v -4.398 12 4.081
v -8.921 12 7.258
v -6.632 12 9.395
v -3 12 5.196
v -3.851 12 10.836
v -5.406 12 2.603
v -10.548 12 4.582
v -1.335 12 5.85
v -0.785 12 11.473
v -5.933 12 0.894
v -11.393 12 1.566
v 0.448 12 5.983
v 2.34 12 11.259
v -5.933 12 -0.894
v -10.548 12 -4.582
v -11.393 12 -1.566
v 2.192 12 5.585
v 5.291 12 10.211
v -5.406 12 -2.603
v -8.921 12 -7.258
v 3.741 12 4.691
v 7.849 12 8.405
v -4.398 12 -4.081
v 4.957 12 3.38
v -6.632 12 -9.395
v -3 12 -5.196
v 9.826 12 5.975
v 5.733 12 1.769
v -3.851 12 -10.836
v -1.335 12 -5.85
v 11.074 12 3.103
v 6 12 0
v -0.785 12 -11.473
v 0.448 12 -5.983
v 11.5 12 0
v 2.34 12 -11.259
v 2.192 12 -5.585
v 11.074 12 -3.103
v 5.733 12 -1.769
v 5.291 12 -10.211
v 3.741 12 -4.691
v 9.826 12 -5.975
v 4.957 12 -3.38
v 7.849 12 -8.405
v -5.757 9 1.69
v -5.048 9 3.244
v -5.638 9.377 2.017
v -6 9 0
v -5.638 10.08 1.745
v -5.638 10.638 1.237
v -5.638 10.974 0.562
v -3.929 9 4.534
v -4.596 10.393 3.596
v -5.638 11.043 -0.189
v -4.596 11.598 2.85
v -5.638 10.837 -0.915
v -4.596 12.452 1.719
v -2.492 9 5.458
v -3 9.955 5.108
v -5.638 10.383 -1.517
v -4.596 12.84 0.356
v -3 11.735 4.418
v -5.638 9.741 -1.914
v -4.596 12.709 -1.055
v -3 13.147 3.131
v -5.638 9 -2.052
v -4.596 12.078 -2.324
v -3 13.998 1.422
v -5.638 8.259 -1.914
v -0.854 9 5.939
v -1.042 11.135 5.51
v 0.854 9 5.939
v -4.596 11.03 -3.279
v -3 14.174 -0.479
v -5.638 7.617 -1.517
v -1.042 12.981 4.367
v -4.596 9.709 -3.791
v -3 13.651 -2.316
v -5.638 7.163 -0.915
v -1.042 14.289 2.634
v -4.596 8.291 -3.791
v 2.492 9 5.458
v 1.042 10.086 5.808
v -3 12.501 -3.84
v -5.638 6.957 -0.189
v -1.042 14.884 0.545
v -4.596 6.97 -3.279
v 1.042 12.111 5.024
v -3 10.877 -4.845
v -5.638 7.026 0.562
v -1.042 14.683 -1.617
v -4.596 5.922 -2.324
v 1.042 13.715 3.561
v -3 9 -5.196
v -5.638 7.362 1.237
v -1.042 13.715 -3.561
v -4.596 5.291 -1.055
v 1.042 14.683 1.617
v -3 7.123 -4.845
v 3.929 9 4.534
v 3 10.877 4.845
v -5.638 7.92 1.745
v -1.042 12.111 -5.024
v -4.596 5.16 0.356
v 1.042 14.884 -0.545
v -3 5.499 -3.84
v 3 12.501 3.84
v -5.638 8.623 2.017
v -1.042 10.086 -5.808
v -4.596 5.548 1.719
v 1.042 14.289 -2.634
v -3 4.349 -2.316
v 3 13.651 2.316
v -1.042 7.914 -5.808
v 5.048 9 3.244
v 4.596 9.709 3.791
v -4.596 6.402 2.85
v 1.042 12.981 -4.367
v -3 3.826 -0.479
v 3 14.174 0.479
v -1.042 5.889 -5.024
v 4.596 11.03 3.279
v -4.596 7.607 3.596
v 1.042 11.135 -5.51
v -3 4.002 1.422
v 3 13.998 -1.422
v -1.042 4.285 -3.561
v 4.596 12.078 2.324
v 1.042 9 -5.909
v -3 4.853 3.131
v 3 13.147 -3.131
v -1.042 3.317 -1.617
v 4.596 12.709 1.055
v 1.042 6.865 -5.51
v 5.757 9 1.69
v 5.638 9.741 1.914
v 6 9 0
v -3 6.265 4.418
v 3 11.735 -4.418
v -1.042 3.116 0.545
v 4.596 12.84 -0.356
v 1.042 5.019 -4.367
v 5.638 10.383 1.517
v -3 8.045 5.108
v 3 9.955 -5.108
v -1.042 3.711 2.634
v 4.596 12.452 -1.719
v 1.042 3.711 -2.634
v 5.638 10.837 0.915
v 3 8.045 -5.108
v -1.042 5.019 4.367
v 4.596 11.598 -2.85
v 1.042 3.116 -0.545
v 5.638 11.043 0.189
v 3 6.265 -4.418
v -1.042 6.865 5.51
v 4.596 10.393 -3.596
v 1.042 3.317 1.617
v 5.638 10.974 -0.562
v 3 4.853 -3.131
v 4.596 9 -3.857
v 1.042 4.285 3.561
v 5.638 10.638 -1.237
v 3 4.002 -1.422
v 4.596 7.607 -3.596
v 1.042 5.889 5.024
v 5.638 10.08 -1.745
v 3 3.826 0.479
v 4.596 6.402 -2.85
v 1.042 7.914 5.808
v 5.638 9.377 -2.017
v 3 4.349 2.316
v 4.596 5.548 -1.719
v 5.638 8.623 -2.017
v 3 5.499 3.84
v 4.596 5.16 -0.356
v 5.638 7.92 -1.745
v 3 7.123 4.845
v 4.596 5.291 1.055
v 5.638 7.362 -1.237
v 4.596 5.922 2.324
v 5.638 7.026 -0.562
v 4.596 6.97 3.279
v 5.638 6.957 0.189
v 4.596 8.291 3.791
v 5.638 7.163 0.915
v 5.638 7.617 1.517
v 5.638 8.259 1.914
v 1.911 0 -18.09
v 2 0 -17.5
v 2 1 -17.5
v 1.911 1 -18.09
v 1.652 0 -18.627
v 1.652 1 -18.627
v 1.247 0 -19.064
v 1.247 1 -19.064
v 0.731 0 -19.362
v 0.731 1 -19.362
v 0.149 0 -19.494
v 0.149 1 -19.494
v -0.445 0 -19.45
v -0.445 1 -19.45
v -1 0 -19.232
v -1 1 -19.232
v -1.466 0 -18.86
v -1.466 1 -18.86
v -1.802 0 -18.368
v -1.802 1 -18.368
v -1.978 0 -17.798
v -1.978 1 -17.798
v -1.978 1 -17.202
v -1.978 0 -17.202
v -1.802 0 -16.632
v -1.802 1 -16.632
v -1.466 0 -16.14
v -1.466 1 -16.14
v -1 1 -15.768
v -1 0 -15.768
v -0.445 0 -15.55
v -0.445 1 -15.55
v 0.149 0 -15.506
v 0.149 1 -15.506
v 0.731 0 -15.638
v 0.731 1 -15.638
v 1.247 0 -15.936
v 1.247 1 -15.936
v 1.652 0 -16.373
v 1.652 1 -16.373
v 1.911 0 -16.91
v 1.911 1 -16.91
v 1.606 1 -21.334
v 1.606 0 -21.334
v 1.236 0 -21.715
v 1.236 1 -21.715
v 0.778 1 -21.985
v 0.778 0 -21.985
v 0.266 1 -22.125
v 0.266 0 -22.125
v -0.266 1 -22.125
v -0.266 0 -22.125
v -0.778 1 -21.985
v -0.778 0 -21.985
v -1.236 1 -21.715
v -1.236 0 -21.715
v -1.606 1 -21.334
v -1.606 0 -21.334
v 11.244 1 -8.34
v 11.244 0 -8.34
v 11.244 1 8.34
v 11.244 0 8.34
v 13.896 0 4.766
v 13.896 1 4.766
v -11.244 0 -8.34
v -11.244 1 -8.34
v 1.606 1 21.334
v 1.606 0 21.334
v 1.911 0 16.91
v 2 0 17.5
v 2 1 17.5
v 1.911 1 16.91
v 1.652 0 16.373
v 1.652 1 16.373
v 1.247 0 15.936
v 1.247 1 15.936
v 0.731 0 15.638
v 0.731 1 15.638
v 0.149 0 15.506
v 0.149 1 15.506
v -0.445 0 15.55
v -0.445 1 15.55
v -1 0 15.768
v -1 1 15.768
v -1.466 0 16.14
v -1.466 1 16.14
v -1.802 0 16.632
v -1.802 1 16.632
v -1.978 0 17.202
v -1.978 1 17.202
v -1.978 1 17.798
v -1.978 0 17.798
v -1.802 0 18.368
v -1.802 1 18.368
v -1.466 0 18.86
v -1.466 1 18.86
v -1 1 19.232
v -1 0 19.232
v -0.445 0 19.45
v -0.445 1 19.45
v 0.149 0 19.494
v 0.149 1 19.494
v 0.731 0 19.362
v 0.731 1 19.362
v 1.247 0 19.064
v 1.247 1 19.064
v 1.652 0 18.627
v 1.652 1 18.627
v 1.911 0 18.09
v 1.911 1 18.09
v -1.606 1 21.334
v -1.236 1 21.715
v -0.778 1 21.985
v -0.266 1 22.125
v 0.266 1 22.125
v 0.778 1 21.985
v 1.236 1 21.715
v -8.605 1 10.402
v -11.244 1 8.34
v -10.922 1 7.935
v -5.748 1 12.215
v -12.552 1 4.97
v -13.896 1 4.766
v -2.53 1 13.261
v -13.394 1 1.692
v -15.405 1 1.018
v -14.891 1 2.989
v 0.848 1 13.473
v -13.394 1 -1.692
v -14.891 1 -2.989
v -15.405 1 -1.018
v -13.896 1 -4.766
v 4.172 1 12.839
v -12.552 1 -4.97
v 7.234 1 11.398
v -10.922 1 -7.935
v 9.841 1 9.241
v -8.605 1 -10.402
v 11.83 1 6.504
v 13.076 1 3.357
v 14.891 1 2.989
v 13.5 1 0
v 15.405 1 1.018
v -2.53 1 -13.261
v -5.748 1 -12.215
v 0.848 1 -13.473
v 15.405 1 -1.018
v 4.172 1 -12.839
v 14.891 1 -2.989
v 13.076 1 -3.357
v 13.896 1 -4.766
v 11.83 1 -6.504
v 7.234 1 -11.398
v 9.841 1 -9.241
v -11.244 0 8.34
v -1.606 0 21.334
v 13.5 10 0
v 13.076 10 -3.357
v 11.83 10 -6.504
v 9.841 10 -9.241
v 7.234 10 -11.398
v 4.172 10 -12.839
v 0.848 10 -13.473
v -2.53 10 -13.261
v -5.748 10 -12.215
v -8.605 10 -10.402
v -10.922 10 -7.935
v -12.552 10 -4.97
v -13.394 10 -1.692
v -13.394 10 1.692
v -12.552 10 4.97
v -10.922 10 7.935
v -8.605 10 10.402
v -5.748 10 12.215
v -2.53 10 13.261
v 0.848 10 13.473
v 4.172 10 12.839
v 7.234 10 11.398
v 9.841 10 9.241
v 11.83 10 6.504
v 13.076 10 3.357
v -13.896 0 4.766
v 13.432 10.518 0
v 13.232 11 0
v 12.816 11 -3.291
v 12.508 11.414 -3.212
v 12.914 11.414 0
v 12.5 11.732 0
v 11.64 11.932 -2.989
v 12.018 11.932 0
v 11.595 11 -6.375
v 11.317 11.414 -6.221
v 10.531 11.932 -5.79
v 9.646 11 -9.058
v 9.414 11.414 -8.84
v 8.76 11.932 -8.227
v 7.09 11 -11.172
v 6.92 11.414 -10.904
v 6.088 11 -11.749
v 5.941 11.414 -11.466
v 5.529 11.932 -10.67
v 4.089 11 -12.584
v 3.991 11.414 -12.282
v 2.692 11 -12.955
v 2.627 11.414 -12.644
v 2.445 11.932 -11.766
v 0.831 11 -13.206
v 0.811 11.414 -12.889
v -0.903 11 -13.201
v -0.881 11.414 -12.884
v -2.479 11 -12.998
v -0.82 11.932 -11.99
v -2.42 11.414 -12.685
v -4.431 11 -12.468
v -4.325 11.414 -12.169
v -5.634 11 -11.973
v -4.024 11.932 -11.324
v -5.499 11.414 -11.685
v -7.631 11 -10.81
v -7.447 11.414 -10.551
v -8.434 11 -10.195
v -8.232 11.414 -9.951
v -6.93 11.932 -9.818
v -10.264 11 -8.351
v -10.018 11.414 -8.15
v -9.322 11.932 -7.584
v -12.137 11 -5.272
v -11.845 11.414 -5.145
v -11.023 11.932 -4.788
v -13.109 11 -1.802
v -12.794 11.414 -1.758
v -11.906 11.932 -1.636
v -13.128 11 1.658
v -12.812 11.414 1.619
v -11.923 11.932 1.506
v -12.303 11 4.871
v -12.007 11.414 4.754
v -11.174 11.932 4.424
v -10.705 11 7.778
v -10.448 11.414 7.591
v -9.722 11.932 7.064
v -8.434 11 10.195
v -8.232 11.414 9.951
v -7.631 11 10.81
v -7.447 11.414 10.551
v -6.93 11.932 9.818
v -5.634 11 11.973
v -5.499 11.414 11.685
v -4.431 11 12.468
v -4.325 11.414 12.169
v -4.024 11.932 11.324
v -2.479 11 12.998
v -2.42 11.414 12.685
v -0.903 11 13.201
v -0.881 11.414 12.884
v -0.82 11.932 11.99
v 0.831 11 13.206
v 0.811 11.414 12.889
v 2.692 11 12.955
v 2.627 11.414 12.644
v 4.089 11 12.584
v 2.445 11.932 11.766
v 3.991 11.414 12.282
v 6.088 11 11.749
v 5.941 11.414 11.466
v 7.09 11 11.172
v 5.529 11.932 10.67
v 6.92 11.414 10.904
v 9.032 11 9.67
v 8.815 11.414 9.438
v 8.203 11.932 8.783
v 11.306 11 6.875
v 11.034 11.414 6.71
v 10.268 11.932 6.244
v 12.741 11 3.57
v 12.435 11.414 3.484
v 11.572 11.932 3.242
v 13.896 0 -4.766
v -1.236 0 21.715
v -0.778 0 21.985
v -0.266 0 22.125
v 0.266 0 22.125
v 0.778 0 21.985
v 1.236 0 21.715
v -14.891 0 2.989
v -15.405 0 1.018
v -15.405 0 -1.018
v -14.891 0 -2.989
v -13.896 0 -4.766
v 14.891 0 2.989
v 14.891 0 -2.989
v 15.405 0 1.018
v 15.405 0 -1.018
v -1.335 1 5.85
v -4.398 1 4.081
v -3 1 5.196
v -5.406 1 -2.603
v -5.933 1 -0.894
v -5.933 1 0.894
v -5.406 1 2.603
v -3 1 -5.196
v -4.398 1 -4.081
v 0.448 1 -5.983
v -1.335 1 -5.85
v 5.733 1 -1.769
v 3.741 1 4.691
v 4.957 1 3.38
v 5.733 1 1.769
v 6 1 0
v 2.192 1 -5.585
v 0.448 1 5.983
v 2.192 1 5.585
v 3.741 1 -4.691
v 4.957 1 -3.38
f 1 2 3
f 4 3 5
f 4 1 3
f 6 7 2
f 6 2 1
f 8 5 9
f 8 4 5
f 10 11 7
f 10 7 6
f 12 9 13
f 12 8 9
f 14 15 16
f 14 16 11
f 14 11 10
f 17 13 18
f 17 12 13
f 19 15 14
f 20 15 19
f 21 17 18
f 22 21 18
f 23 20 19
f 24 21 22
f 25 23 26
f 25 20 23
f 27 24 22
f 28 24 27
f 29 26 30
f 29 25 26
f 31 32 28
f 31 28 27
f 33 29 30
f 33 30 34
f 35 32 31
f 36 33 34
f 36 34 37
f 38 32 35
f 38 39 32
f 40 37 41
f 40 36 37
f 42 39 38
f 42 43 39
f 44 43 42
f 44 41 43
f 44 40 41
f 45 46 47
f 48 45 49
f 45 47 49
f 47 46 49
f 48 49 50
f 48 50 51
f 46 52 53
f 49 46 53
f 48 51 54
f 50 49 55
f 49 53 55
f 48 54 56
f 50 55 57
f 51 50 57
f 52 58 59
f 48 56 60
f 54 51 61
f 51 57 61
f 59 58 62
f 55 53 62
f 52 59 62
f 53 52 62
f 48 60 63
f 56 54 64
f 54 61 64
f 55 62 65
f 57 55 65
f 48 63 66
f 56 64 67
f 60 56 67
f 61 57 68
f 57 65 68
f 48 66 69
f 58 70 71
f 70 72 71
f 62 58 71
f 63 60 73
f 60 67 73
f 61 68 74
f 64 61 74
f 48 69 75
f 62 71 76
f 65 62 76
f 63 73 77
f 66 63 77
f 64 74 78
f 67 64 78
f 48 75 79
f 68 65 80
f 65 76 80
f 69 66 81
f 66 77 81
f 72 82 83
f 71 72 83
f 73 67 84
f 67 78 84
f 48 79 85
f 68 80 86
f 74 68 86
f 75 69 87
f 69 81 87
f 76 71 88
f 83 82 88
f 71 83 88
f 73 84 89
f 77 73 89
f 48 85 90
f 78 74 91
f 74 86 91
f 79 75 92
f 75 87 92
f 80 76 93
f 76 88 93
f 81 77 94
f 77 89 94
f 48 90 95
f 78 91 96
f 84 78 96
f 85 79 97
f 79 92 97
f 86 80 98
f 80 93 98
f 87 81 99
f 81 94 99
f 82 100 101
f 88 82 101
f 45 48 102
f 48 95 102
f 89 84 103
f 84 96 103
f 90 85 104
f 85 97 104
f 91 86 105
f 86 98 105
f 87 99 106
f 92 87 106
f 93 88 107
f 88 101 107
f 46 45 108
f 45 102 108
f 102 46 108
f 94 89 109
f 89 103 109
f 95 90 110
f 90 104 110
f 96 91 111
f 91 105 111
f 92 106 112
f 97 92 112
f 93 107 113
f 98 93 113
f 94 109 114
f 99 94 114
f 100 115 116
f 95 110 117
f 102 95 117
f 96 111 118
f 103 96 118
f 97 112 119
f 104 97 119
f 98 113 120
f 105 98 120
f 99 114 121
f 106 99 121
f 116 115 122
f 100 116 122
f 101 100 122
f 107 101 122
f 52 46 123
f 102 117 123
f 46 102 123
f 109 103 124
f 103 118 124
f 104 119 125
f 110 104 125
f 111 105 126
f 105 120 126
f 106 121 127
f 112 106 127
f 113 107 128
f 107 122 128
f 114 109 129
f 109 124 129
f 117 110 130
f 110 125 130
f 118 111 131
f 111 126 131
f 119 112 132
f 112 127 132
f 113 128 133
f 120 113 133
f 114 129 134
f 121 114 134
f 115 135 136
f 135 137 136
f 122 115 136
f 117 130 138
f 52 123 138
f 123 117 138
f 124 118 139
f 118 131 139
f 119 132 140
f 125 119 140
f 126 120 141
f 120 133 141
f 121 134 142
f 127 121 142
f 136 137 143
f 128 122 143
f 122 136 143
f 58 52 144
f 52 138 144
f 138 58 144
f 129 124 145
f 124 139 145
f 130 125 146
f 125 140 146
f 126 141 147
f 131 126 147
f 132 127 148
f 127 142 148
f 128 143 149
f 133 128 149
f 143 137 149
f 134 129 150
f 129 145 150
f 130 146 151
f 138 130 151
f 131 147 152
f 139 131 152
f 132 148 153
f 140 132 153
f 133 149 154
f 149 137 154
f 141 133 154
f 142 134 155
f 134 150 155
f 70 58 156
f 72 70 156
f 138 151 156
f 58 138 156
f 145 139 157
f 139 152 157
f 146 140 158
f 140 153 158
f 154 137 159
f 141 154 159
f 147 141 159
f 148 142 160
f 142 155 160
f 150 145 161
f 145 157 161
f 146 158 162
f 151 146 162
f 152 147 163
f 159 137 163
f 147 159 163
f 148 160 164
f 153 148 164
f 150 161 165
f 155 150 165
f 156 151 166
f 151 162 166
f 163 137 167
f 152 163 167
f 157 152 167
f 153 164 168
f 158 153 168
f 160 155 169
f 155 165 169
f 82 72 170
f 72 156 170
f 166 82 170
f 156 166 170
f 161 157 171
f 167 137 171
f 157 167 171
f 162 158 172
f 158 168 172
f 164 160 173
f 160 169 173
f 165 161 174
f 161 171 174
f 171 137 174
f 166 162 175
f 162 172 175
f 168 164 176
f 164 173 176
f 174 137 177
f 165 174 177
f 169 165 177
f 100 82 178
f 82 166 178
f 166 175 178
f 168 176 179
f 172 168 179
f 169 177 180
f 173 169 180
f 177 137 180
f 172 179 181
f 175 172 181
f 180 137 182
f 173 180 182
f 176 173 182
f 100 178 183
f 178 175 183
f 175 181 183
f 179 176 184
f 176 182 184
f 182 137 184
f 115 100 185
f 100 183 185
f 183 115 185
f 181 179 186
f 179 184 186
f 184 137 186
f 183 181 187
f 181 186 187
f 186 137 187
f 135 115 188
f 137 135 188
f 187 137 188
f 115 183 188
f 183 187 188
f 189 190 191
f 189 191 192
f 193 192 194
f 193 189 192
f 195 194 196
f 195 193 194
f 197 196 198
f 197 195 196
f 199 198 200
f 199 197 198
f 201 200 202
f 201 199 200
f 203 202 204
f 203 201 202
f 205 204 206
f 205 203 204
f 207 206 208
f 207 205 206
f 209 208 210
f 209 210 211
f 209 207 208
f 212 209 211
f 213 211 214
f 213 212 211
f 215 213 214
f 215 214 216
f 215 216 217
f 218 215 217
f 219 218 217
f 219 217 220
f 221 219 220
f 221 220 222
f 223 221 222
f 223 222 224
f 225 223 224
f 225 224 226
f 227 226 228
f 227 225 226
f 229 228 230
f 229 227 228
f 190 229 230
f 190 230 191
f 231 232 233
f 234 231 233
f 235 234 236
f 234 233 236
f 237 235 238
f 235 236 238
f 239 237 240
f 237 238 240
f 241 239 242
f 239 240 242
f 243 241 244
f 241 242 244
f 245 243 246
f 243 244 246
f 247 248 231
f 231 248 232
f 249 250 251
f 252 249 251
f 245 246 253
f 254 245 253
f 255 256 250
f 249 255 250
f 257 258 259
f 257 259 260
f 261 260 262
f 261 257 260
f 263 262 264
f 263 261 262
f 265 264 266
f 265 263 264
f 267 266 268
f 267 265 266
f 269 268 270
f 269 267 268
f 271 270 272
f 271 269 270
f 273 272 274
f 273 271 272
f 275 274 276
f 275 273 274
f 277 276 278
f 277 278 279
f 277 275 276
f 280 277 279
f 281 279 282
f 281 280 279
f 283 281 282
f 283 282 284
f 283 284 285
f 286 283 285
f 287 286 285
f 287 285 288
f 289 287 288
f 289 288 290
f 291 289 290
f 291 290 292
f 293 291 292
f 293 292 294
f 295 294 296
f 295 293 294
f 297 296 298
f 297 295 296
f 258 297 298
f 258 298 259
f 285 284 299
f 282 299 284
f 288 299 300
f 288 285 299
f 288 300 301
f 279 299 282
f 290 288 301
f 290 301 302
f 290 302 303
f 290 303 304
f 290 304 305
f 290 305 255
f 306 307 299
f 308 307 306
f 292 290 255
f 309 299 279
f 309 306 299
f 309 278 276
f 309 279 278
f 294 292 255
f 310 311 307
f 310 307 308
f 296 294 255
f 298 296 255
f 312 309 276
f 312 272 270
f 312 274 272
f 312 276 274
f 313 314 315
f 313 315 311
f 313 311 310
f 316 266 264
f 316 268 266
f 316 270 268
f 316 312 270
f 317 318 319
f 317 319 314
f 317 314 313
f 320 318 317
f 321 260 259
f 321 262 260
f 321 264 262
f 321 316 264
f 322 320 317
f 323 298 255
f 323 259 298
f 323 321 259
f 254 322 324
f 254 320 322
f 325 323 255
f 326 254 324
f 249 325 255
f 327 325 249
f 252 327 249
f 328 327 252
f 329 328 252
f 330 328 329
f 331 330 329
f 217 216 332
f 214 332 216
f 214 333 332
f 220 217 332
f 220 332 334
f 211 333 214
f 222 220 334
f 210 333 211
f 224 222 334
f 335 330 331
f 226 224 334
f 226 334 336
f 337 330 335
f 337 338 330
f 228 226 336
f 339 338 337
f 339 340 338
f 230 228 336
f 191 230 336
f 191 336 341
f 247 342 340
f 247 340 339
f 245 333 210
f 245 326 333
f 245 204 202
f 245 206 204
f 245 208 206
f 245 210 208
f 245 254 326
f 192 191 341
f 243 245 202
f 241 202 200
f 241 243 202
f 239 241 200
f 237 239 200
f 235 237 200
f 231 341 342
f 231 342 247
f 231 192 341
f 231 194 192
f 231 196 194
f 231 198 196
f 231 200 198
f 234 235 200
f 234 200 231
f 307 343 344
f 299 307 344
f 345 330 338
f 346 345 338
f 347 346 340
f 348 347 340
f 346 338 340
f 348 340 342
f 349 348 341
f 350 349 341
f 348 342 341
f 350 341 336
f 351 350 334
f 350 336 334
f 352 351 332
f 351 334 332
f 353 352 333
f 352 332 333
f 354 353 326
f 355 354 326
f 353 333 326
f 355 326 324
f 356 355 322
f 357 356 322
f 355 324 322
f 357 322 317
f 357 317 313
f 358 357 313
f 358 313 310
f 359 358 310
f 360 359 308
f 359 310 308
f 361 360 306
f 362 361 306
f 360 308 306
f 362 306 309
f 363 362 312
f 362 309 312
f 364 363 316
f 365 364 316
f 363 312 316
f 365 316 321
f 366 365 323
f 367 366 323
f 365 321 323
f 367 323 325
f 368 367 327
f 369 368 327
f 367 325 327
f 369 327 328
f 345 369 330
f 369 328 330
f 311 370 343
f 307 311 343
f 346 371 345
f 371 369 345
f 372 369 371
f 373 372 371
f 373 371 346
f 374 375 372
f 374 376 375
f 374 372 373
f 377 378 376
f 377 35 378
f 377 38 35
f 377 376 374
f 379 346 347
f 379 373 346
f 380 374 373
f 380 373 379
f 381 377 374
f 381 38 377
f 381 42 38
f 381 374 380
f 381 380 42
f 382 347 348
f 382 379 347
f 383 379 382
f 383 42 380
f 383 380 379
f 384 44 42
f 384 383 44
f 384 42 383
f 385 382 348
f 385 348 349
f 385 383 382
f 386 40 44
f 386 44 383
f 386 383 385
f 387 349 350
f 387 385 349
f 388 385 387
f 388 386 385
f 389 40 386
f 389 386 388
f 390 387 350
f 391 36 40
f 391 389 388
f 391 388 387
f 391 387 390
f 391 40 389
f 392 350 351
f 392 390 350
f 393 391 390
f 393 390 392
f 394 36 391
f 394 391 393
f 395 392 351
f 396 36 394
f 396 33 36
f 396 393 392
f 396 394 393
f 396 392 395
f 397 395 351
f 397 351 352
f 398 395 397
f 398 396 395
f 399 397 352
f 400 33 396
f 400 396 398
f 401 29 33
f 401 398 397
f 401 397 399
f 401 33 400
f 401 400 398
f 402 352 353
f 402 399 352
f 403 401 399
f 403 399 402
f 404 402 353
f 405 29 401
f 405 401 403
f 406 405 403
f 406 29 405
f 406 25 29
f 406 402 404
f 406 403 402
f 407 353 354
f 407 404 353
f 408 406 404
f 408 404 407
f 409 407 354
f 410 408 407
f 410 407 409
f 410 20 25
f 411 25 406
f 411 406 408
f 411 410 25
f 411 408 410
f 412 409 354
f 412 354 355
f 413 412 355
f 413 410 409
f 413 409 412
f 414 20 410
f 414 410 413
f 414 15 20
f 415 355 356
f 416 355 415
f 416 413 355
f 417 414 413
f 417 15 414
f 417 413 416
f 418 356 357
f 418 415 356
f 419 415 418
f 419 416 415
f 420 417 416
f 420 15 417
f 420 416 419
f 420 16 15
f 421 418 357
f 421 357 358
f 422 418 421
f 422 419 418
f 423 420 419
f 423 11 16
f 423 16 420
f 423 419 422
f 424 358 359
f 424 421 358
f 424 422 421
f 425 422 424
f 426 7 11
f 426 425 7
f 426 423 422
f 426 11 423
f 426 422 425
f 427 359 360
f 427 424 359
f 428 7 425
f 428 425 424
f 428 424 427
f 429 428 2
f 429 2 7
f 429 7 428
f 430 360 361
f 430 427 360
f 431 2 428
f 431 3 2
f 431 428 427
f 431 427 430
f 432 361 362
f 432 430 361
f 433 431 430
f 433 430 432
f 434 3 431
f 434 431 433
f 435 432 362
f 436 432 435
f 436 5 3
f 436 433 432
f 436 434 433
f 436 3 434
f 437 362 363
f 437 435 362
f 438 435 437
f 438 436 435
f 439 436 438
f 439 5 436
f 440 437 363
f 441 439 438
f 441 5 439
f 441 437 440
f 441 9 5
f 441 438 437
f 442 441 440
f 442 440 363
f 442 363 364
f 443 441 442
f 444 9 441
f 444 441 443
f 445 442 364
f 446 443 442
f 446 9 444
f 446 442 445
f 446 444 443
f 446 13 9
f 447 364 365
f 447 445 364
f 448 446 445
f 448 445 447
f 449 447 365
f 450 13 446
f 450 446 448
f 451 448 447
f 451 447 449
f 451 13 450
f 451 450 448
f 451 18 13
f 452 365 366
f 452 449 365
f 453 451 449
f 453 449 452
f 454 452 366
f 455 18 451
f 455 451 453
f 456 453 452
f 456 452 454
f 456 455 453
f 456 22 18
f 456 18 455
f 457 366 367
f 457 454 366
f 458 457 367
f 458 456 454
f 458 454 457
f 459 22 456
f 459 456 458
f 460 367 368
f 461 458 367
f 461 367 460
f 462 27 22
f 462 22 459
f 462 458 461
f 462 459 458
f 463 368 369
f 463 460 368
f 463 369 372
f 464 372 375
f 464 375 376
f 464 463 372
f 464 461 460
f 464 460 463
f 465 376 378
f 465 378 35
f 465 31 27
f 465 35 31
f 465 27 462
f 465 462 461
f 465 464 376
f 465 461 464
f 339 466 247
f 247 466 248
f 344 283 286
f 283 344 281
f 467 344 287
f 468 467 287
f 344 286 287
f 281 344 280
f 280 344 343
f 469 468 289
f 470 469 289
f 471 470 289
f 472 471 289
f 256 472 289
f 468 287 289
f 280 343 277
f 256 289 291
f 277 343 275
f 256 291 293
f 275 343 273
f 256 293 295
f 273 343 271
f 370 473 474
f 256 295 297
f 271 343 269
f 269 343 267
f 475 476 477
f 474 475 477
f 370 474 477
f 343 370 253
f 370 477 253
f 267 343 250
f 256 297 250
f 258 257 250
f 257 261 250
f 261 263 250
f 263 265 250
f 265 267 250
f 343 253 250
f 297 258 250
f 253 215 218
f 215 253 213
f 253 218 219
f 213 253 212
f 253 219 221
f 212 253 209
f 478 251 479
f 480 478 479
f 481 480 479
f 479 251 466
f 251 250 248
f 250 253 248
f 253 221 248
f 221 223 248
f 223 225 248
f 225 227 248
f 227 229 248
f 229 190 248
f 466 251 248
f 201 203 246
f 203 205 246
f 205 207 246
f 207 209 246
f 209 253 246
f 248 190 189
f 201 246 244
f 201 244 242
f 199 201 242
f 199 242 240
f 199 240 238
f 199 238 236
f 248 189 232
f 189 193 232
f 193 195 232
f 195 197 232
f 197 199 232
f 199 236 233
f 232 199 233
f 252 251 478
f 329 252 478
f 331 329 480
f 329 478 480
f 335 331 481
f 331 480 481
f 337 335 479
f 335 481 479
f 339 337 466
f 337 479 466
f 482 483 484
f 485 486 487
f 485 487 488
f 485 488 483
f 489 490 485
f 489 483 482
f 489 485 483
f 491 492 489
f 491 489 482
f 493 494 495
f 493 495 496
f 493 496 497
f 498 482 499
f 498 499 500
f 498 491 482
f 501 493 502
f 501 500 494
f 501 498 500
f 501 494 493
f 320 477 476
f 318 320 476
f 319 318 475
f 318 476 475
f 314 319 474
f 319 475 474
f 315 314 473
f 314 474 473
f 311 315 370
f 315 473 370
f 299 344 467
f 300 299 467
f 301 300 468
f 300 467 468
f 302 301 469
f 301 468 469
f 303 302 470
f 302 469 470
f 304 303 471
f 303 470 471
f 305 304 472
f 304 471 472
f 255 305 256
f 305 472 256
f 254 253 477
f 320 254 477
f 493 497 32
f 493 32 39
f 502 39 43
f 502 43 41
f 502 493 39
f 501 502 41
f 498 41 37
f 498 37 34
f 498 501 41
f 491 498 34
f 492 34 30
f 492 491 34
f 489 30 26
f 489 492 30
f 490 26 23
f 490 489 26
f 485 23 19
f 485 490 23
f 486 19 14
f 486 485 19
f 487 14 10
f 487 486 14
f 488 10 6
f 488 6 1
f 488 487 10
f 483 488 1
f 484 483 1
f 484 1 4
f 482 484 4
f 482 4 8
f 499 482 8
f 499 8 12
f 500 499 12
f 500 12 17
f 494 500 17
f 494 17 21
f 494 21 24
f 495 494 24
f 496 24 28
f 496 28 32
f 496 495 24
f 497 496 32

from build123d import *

# Parameters (mm, degrees)
SKETCH_1_R      = 2
SKETCH_1_R_2    = 14
EXTRUDE_1_DEPTH = 1
SKETCH_2_R      = 13.5
SKETCH_2_R_2    = 6
EXTRUDE_2_DEPTH = 11
FILLET_1_R      = 2


with BuildPart() as part:
    # 草图1 → 凸台-拉伸1 (new body)
    with BuildSketch(Plane(origin=(0, 0, 0), x_dir=(1, 0, 0), z_dir=(0, 1, 0))):
        with BuildLine():
            ThreePointArc((1.606347752, 21.334346505), (0, 22.142857143), (-1.606347752, 21.334346505))
            Line((-1.606347752, 21.334346505), (-11.244434288, 8.340425501))
            ThreePointArc((-11.244434288, 8.340425501), (5.1e-08, 14), (11.244434349, 8.340425419))
            Line((11.244434349, 8.340425419), (1.606347752, 21.334346505))
        make_face()
        with Locations((0, 17.5)):
            Circle(SKETCH_1_R, mode=Mode.SUBTRACT)
        Circle(SKETCH_1_R_2)
        with BuildLine():
            Line((13.895753503, 4.765957447), (11.244434349, 8.340425419))
            ThreePointArc((11.244434349, 8.340425419), (13.293270495, 4.391919803), (14, 0))
            ThreePointArc((14, 0), (13.293270397, -4.3919201), (11.244433977, -8.340425921))
            Line((11.244433977, -8.340425921), (13.895753503, -4.765957447))
            ThreePointArc((13.895753503, -4.765957447), (15.470362494, 0), (13.895753503, 4.765957447))
        make_face()
        with BuildLine():
            ThreePointArc((11.244433977, -8.340425921), (-1.78e-07, -14), (-11.244434189, -8.340425635))
            Line((-11.244434189, -8.340425635), (-1.606347752, -21.334346505))
            ThreePointArc((-1.606347752, -21.334346505), (0, -22.142857143), (1.606347752, -21.334346505))
            Line((1.606347752, -21.334346505), (11.244433977, -8.340425921))
        make_face()
        with Locations((0, -17.5)):
            Circle(SKETCH_1_R, mode=Mode.SUBTRACT)
        with BuildLine():
            ThreePointArc((-11.244434189, -8.340425635), (-14, -8.3e-08), (-11.244434288, 8.340425501))
            Line((-11.244434288, 8.340425501), (-13.895753503, 4.765957447))
            ThreePointArc((-13.895753503, 4.765957447), (-15.470362494, 0), (-13.895753503, -4.765957447))
            Line((-13.895753503, -4.765957447), (-11.244434189, -8.340425635))
        make_face()
    extrude(amount=EXTRUDE_1_DEPTH)

    # 草图2 → 凸台-拉伸2 (add)
    with BuildSketch(Plane(origin=(0, 1, 0), x_dir=(1, 0, 0), z_dir=(0, 1, 0))):
        Circle(SKETCH_2_R)
        Circle(SKETCH_2_R_2, mode=Mode.SUBTRACT)
    extrude(amount=EXTRUDE_2_DEPTH)

    # 圆角1
    fillet_1_edges = [part.edges().sort_by_distance(p)[0] for p in [
        (-13.5, 12, 0),
    ]]
    fillet(fillet_1_edges, radius=FILLET_1_R)


with BuildPart() as body_2:
    # 草图5 one side → 旋转3 (revolve)
    with BuildSketch(Plane(origin=(0, 9, 0), x_dir=(1, 0, 0), z_dir=(0, 1, 0))):
        with BuildLine():
            Line((6, 0), (-6, 0))
            ThreePointArc((-6, 0), (0, -6), (6, 0))
        make_face()
    revolve(axis=Axis((6, 9, 0), (-1, 0, 0)))


solid = Compound([part.part, body_2.part])
